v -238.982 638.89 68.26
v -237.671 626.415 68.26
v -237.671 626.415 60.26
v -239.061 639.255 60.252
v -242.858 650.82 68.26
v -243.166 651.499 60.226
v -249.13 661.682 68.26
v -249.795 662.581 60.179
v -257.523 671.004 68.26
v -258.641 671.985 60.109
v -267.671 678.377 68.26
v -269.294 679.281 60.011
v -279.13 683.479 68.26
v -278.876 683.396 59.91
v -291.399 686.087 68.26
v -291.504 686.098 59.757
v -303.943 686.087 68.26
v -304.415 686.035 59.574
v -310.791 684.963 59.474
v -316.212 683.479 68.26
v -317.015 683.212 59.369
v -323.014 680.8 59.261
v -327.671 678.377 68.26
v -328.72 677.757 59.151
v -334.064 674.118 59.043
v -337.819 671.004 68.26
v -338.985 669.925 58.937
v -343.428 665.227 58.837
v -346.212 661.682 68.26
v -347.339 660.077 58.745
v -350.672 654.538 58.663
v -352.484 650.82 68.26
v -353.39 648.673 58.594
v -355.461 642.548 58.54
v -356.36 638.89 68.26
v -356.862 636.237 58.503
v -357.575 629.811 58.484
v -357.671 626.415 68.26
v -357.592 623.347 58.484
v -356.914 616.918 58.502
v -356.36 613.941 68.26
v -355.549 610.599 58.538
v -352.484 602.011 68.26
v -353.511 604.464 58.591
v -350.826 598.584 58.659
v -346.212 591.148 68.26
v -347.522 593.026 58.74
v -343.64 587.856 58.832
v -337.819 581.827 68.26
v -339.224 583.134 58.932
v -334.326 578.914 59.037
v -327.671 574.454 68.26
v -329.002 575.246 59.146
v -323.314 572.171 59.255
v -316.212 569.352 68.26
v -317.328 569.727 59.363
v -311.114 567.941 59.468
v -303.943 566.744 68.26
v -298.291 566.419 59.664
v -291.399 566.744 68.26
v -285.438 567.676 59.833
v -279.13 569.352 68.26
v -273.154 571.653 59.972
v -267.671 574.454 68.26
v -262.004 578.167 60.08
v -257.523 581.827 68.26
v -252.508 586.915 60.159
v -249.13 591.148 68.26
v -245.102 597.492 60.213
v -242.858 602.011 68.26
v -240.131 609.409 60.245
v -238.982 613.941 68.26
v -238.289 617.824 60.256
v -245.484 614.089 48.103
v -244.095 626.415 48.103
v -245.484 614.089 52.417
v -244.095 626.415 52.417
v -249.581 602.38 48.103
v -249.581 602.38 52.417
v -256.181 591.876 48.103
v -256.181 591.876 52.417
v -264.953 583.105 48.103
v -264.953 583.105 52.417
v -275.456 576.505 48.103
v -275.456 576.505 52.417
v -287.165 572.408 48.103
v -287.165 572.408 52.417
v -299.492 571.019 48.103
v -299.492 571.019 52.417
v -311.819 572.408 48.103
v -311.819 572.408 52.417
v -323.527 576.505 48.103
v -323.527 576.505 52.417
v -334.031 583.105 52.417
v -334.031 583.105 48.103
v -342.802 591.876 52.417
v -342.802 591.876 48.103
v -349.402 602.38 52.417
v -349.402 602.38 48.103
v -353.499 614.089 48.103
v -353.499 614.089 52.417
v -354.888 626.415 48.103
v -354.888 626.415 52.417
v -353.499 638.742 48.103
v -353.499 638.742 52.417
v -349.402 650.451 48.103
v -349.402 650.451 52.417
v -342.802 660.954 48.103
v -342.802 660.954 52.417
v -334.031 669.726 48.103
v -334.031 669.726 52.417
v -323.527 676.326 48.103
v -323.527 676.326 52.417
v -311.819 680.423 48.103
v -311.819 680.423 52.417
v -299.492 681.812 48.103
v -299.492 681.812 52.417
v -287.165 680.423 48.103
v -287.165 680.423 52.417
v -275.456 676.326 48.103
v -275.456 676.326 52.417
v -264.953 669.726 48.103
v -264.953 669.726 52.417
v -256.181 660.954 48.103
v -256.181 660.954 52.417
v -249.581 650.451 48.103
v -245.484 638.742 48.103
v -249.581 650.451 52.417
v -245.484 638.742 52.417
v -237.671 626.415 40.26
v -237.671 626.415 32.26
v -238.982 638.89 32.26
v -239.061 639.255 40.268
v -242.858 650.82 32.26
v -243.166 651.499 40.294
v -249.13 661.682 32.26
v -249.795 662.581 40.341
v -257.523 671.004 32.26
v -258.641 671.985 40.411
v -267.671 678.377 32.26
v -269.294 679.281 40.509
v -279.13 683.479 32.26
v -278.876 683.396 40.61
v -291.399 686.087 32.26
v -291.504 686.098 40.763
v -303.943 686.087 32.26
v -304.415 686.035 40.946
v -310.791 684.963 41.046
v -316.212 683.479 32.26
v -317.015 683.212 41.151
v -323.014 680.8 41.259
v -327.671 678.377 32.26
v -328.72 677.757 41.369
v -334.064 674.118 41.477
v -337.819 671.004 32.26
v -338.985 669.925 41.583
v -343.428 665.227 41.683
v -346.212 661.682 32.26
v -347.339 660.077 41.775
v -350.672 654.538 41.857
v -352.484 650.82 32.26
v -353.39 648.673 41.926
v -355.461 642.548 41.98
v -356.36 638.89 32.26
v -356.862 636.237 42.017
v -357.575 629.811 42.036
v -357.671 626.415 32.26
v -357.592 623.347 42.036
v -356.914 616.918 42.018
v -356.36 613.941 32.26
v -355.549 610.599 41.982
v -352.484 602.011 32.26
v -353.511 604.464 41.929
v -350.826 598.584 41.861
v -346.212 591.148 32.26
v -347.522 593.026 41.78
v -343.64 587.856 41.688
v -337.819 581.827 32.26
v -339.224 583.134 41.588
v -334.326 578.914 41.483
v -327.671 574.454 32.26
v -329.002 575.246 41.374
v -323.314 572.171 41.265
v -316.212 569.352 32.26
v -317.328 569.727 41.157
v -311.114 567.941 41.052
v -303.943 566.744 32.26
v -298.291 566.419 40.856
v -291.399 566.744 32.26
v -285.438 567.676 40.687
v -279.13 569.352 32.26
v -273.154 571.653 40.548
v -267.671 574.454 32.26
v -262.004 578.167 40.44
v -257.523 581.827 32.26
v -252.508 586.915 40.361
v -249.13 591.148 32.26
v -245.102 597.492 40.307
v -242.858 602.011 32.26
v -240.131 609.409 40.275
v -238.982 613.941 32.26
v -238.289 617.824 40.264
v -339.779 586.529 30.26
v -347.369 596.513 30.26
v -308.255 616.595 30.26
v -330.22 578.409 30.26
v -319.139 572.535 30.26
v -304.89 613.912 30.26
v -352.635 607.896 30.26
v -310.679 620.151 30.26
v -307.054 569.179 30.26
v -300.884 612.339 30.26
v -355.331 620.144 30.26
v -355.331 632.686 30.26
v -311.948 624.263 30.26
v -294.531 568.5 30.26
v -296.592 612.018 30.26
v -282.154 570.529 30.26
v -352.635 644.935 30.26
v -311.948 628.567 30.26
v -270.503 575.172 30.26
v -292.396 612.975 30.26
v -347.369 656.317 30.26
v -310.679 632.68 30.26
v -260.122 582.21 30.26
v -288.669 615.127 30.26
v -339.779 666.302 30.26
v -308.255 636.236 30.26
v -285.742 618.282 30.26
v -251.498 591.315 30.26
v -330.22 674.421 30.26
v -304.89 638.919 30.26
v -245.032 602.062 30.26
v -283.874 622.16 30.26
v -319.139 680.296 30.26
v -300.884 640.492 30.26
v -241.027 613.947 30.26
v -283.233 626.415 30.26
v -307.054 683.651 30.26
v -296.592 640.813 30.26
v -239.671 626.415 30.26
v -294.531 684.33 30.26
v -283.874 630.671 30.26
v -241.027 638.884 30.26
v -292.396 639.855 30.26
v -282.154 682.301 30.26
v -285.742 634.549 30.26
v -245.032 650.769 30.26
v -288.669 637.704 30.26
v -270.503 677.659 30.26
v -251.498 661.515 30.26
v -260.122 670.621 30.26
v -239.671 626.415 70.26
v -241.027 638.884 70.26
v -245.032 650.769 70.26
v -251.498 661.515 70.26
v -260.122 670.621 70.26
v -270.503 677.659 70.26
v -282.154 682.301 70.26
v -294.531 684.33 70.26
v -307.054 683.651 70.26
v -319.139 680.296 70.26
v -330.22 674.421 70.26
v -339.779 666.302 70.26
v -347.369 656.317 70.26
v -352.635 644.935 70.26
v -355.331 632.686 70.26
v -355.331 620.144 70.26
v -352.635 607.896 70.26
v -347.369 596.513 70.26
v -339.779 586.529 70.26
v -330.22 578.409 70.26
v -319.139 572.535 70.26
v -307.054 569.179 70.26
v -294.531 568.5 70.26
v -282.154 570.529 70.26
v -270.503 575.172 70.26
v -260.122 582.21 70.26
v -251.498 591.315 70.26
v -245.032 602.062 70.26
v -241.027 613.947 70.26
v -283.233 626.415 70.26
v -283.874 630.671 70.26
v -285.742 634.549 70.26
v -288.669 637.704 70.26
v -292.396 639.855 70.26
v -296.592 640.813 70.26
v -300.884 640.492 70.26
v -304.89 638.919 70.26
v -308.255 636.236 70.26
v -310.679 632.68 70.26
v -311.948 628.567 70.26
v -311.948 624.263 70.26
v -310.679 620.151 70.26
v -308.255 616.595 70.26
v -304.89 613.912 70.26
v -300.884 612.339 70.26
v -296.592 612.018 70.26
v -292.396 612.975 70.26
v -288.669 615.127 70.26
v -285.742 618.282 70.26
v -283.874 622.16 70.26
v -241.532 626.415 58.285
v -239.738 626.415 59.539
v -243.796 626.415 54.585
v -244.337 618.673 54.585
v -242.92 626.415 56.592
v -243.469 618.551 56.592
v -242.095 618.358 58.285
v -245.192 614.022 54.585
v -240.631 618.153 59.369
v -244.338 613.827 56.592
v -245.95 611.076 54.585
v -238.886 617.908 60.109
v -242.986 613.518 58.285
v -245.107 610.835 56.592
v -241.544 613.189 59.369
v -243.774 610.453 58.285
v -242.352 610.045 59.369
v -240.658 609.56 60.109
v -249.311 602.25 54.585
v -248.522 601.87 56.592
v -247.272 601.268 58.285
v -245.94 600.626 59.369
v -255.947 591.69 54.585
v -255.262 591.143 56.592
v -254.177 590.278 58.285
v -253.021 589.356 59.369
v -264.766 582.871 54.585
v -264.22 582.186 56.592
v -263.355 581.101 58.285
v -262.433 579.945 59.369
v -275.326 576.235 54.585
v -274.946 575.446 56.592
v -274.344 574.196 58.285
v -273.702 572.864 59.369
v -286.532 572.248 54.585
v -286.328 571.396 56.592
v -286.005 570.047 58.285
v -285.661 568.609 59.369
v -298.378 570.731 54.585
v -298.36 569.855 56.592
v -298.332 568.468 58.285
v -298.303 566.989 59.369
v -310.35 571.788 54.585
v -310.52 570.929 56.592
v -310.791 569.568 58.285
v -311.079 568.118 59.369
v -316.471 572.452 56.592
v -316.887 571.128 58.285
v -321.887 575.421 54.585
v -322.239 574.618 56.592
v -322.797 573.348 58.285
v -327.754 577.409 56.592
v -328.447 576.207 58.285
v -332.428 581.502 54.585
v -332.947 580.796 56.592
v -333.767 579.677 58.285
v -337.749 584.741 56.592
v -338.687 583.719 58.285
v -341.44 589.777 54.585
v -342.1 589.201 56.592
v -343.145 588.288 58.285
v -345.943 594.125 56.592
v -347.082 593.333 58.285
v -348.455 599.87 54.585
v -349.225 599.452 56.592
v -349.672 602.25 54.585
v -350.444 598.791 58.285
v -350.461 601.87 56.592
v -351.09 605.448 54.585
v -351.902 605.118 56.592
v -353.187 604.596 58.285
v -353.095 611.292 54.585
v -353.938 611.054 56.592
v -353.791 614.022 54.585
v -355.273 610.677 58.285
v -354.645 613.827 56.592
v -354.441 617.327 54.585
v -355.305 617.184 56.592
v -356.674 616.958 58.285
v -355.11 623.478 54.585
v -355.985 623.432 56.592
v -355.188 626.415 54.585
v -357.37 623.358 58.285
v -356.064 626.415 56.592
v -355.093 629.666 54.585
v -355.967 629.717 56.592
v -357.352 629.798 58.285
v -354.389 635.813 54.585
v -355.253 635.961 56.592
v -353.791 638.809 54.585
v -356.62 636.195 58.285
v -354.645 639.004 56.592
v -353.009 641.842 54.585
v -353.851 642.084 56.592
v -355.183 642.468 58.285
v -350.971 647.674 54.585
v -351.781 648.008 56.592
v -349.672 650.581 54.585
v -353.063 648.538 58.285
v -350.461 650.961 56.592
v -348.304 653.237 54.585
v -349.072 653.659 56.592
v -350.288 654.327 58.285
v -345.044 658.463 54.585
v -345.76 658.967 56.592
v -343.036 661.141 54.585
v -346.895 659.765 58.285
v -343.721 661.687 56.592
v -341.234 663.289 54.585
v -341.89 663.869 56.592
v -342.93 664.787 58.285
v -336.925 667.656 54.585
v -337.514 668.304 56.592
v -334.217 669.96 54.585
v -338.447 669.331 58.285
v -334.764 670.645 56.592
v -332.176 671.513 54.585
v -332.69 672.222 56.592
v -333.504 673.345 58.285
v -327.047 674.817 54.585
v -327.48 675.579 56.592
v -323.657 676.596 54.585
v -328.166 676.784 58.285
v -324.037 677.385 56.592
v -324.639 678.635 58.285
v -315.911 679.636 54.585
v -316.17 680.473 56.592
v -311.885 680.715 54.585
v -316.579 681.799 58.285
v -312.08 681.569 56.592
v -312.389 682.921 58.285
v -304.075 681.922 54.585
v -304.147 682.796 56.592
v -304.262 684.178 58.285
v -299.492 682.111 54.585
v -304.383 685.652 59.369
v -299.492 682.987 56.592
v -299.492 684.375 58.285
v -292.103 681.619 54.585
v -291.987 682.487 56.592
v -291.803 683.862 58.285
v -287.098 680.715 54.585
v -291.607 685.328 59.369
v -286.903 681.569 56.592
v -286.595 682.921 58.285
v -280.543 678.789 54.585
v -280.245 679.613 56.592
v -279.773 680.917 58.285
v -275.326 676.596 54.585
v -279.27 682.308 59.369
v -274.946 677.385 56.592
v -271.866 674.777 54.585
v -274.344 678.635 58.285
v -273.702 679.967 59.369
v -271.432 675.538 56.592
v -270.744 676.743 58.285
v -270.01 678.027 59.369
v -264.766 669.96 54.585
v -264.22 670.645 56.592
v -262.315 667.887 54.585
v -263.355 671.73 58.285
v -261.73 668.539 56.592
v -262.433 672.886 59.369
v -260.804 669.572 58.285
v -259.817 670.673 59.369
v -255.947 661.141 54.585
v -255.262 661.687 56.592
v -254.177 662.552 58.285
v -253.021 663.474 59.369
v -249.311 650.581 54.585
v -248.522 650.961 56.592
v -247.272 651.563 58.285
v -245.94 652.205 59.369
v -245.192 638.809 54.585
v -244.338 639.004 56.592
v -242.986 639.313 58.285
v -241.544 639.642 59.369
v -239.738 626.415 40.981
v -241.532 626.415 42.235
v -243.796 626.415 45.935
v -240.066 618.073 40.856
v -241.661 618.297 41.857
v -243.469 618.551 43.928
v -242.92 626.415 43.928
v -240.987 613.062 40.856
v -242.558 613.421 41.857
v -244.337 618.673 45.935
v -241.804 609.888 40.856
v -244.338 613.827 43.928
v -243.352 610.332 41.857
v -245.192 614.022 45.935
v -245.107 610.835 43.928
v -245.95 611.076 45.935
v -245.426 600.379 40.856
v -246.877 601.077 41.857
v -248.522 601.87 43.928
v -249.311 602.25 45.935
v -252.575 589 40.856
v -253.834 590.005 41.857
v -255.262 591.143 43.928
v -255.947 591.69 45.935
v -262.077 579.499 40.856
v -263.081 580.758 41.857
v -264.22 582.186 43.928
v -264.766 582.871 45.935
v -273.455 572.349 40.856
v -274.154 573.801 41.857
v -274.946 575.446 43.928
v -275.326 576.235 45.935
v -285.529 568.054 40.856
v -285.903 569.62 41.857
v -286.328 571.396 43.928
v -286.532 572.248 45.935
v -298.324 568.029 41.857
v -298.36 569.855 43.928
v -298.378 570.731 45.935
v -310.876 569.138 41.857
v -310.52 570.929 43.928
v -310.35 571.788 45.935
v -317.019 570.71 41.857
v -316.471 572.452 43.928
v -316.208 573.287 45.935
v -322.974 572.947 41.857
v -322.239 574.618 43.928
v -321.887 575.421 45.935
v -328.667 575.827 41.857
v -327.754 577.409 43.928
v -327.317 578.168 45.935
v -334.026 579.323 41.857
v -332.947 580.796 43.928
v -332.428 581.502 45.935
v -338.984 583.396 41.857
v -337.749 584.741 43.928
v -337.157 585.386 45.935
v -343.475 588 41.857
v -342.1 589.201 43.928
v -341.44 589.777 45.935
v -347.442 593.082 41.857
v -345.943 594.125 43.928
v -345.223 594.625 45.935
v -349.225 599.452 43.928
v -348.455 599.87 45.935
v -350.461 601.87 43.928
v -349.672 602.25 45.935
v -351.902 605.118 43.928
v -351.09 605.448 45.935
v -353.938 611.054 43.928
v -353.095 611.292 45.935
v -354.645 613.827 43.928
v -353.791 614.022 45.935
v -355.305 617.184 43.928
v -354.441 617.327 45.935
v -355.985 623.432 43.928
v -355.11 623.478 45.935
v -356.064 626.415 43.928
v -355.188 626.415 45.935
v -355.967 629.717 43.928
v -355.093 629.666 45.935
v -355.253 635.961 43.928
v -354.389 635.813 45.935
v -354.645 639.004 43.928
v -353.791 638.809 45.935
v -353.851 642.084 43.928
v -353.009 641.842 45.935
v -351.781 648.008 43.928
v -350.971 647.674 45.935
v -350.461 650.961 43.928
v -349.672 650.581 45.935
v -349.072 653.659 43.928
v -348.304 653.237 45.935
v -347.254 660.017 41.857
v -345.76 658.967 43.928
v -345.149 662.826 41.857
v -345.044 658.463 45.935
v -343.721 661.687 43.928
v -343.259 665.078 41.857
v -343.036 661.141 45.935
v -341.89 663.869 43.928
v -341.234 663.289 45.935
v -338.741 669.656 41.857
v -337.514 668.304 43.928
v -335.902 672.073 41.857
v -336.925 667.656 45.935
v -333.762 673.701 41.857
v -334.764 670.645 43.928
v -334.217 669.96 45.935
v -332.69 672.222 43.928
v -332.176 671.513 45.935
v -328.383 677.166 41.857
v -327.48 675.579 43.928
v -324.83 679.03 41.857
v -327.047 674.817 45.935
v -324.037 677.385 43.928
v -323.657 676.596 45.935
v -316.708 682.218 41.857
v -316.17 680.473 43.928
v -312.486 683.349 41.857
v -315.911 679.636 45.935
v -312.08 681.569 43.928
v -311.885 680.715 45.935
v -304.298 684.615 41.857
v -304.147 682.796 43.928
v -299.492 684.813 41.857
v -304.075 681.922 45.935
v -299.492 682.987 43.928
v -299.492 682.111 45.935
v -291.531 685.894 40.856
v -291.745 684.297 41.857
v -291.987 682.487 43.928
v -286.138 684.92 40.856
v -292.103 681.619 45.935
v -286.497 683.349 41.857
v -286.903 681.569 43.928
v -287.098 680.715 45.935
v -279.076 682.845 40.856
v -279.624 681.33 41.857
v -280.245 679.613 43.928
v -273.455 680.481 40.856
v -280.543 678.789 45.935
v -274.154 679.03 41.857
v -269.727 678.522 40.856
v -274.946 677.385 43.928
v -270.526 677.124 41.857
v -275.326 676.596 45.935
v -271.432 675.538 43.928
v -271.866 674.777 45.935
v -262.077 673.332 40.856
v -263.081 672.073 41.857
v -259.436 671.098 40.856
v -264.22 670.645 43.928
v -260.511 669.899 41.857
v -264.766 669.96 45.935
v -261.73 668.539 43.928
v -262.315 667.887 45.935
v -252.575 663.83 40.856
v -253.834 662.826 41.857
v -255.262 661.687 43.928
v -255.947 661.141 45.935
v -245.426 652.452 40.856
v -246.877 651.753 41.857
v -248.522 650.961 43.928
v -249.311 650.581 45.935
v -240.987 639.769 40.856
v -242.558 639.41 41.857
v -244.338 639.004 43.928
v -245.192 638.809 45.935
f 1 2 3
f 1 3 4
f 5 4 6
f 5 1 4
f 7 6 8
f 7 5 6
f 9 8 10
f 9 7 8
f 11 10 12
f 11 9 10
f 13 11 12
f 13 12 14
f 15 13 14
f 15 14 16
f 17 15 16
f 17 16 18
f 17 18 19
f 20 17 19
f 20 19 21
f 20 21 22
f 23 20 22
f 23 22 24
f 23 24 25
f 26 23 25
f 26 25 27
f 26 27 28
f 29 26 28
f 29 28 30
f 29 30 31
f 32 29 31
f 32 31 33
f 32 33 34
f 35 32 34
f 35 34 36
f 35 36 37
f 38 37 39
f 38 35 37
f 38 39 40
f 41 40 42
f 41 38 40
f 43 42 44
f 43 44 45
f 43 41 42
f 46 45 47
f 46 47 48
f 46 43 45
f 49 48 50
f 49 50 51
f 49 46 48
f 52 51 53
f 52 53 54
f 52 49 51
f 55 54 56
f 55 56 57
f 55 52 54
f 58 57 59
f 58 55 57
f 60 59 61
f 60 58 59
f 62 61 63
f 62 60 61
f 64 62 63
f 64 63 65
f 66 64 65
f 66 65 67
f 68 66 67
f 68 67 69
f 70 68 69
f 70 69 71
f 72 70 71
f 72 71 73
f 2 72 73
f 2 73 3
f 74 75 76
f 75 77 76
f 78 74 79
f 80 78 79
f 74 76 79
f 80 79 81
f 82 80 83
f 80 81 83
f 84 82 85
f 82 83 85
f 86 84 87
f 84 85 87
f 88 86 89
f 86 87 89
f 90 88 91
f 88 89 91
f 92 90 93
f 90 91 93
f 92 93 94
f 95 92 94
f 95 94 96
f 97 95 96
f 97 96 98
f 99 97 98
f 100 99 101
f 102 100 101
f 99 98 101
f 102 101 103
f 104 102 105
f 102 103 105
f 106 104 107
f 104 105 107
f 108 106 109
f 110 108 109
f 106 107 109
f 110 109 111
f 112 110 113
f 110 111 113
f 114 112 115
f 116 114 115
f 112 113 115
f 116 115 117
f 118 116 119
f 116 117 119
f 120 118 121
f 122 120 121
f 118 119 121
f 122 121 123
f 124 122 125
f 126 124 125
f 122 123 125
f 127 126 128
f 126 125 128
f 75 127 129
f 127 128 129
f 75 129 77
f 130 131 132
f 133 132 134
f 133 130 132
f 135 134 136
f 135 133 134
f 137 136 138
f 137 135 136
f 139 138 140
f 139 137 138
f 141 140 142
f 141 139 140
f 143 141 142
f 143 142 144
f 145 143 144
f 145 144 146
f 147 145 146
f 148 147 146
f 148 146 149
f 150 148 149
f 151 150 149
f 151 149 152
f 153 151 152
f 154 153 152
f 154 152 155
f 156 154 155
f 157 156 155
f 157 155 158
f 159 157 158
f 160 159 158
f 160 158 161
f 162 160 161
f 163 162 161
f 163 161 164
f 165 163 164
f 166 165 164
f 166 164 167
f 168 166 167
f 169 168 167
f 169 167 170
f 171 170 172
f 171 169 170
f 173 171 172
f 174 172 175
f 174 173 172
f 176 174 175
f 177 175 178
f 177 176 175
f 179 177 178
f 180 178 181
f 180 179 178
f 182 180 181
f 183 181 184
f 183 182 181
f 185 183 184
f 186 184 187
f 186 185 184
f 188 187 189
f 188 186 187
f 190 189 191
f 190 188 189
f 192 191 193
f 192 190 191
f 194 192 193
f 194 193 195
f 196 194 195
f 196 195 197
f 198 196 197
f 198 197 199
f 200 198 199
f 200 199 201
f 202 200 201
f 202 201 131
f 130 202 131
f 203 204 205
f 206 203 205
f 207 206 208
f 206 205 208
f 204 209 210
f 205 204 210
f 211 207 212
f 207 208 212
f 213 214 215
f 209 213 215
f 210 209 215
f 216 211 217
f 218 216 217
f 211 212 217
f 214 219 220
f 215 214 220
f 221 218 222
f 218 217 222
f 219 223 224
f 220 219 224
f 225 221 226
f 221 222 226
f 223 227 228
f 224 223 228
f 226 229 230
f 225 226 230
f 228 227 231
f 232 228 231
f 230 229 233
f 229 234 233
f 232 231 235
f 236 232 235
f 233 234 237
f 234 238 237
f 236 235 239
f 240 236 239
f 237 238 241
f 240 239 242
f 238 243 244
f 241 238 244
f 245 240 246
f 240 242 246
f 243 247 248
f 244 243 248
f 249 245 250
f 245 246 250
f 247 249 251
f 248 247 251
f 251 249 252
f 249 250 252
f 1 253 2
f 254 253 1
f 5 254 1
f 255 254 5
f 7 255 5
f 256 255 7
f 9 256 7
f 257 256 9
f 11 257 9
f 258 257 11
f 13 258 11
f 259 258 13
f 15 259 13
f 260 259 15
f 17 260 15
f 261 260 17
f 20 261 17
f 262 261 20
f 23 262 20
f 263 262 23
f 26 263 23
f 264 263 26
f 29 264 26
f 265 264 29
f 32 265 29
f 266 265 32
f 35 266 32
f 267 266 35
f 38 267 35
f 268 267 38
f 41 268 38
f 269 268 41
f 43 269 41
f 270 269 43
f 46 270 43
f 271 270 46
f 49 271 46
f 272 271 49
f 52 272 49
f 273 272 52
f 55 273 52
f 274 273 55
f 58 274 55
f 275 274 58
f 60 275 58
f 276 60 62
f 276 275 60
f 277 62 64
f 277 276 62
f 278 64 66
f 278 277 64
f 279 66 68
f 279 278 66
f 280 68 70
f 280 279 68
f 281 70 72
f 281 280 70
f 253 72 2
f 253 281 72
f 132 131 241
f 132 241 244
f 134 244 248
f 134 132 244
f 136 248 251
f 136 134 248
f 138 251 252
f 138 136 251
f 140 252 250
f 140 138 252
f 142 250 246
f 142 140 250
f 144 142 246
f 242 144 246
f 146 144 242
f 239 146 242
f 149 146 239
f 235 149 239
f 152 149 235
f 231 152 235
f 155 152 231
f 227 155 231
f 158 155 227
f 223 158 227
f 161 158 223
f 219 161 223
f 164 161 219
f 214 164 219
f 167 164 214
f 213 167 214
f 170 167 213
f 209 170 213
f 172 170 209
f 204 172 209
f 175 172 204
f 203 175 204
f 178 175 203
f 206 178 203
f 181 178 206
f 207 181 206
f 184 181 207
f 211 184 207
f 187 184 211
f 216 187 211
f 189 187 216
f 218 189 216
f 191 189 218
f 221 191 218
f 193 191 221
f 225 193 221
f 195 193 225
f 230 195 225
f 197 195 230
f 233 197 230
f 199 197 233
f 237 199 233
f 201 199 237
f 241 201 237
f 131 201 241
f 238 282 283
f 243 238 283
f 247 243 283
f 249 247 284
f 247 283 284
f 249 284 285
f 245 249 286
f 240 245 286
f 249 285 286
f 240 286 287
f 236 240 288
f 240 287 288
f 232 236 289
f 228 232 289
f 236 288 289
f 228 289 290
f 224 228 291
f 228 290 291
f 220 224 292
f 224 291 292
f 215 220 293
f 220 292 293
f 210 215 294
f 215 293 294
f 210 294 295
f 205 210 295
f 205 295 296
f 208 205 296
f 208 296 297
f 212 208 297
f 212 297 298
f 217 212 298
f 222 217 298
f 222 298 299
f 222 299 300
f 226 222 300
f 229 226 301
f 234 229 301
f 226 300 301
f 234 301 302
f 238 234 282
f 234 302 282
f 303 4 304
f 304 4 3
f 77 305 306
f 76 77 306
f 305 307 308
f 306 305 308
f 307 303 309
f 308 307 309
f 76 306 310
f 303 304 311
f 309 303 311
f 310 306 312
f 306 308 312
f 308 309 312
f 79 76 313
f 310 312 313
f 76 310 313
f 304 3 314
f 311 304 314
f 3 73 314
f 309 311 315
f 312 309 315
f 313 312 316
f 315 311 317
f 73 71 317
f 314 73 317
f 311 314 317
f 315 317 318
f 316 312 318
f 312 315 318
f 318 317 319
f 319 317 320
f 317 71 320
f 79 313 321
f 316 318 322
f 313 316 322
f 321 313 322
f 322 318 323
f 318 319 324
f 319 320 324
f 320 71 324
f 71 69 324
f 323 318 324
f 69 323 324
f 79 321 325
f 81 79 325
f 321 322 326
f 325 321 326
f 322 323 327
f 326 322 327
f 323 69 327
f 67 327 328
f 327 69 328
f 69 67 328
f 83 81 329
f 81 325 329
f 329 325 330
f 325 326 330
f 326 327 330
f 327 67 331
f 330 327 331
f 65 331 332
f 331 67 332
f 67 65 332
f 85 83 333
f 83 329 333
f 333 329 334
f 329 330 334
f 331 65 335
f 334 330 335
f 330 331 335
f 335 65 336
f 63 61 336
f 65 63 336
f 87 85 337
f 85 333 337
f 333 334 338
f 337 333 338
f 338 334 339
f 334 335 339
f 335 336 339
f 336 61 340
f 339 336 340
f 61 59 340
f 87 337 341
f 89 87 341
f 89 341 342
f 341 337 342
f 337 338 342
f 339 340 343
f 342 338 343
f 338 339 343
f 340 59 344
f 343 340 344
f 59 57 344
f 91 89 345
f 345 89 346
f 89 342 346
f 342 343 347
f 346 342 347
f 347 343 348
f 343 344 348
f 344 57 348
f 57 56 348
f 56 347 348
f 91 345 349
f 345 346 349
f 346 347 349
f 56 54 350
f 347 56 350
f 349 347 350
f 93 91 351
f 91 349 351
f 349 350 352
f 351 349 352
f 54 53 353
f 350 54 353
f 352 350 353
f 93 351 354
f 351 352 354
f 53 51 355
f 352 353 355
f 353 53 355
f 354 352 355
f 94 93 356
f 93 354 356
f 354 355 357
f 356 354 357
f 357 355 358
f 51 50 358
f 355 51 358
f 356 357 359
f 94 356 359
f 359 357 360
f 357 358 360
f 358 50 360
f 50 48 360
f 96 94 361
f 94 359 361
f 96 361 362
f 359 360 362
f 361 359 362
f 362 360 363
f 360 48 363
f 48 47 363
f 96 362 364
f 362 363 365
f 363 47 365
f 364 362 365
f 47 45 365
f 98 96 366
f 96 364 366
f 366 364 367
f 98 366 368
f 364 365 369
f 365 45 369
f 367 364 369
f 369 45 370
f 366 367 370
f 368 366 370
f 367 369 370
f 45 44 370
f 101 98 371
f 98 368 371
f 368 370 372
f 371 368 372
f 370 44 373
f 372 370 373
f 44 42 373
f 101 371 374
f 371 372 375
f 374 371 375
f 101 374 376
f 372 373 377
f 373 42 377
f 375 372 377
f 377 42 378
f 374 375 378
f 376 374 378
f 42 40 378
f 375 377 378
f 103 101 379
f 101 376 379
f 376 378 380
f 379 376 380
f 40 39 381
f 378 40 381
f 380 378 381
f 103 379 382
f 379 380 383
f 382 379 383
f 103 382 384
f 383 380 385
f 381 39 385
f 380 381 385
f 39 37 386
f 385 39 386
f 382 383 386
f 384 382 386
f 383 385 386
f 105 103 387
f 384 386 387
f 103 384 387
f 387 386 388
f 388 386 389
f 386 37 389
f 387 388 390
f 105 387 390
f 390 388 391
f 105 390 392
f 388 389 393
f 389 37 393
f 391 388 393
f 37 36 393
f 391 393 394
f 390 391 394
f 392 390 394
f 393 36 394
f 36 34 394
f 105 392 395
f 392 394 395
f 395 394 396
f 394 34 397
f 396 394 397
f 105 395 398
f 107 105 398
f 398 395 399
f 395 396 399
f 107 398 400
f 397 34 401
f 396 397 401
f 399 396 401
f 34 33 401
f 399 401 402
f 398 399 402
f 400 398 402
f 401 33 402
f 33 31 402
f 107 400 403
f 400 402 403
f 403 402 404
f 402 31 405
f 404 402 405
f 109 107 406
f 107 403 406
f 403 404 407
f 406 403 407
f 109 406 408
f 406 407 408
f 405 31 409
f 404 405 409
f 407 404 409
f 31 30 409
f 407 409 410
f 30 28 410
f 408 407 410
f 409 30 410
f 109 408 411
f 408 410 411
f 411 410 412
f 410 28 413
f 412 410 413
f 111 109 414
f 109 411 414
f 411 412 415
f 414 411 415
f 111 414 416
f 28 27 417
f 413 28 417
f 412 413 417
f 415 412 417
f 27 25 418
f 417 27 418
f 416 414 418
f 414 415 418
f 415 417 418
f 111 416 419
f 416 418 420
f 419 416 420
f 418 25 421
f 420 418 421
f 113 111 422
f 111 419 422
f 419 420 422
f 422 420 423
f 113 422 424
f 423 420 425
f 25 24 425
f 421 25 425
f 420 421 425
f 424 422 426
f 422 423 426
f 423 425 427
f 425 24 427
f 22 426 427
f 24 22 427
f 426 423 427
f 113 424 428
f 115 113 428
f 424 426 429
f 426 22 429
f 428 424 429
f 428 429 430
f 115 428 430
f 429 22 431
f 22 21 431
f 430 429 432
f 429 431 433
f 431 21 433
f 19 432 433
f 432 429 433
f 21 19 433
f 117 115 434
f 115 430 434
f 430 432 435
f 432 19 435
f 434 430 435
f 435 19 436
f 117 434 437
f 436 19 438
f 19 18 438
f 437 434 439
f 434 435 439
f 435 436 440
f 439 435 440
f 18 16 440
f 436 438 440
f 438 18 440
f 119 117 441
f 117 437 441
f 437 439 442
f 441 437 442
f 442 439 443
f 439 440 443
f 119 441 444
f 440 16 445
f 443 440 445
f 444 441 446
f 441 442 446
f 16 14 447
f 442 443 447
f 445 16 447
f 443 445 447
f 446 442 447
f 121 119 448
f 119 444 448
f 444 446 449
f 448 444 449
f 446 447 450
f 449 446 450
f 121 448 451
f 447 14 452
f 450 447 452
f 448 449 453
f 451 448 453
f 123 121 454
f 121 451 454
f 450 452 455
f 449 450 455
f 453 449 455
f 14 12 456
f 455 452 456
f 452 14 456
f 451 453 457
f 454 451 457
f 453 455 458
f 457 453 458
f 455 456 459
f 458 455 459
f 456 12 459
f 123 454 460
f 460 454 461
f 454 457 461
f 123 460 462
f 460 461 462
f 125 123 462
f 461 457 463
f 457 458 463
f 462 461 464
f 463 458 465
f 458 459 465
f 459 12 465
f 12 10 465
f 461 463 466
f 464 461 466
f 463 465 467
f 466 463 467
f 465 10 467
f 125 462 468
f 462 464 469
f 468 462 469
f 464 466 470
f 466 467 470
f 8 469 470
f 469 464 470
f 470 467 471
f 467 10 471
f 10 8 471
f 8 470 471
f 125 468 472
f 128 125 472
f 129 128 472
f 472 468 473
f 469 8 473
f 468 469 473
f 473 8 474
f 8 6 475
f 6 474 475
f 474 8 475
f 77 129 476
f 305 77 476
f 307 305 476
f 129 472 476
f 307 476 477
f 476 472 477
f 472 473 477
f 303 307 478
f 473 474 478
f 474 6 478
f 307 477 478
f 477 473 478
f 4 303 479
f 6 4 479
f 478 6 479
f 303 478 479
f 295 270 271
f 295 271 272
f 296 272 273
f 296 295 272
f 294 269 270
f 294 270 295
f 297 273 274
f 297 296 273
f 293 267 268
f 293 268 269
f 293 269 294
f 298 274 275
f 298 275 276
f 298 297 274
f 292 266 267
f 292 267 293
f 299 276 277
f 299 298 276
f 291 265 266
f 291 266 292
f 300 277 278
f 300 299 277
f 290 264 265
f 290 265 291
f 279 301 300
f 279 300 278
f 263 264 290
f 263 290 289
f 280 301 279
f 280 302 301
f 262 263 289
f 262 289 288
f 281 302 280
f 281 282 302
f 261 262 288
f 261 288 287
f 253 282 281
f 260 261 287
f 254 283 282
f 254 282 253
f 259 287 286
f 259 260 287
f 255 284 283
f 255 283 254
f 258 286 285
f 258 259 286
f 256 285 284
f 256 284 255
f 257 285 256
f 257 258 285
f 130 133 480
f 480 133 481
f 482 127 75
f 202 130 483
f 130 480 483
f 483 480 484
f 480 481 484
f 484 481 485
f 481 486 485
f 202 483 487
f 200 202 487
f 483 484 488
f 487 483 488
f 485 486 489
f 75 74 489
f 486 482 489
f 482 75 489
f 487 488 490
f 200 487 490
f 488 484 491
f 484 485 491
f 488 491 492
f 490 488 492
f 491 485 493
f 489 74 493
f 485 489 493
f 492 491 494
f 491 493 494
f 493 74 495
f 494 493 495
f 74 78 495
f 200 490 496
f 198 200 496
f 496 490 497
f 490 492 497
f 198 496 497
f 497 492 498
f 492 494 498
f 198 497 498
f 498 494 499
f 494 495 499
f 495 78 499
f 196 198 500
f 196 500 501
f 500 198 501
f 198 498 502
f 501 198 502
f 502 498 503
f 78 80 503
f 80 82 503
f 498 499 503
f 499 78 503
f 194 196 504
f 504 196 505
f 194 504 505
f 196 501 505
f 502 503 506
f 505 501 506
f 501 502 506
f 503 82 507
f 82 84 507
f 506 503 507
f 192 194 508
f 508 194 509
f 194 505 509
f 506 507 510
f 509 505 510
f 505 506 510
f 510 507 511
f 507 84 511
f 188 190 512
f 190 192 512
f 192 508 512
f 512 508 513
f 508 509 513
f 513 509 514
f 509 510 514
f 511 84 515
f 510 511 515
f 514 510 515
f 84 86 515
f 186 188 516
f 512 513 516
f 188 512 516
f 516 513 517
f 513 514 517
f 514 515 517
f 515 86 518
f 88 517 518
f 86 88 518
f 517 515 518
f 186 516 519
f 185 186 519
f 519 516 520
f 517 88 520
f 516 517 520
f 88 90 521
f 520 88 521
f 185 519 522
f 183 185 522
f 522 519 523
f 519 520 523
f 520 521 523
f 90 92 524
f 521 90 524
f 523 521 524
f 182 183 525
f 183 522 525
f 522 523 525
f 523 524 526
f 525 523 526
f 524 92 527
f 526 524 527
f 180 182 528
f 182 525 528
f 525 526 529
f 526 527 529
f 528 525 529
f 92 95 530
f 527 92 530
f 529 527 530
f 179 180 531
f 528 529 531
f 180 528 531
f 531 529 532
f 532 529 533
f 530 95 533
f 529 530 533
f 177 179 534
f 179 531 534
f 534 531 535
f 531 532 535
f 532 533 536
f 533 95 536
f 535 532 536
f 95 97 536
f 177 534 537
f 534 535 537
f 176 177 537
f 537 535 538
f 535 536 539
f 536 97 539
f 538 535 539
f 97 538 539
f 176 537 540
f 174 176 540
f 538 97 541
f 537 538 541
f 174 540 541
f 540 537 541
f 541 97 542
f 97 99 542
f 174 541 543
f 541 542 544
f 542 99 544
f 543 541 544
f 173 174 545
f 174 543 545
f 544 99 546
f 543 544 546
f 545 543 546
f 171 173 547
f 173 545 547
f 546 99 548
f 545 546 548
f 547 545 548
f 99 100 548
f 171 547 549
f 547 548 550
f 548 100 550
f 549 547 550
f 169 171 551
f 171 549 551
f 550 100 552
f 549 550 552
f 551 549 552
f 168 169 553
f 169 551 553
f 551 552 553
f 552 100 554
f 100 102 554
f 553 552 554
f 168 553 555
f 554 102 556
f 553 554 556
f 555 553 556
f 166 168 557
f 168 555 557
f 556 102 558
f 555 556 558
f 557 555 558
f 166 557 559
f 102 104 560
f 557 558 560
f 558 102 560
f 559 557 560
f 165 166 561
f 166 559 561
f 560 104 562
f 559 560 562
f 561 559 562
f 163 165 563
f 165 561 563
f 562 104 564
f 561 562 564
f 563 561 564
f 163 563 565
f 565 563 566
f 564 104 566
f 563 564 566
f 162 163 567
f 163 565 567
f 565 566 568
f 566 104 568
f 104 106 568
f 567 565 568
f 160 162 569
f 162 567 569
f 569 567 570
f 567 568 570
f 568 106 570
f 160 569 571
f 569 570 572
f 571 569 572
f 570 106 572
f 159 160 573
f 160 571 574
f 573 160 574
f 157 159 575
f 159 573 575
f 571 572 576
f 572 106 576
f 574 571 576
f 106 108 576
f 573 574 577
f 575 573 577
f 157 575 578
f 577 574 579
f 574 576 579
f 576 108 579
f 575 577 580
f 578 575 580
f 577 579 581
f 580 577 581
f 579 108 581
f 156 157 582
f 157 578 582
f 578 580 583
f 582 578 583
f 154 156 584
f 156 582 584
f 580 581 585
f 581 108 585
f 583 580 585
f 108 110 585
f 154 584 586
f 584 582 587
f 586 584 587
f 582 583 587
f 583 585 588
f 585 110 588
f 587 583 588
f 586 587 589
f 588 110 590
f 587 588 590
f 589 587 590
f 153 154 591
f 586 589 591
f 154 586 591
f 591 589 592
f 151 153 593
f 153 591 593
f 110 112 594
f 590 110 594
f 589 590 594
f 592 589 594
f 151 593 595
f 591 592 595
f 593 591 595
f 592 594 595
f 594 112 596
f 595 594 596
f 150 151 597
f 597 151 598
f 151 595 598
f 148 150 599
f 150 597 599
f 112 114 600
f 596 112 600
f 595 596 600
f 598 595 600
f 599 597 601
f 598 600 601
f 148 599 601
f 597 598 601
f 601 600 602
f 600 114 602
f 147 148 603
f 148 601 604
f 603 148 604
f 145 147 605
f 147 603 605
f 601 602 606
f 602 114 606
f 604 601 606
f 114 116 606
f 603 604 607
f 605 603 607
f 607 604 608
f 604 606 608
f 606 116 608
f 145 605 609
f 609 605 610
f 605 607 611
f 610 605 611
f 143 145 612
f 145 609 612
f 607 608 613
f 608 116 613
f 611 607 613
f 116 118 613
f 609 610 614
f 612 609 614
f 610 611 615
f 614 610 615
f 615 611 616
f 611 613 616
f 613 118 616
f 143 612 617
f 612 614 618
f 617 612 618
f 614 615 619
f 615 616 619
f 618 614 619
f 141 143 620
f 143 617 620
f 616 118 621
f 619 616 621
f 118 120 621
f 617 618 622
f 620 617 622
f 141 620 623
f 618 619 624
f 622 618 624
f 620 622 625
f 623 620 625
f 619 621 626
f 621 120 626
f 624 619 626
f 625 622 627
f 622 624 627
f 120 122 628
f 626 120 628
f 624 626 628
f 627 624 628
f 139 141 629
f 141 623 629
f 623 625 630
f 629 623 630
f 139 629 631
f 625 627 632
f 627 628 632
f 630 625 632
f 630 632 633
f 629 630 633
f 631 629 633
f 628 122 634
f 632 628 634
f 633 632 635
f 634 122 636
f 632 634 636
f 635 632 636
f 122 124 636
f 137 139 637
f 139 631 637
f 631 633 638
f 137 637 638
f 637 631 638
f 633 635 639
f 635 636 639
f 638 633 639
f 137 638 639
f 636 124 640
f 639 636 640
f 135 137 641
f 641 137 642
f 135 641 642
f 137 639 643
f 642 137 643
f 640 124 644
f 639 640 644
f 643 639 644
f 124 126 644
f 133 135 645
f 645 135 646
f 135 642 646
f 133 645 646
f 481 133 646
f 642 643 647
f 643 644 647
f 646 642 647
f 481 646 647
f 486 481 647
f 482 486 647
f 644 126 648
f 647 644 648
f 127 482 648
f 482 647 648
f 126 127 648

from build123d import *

# Parameters (mm, degrees)
SKETCH_1_R      = 60
SKETCH_1_R_2    = 14.438127561
EXTRUDE_1_DEPTH = 40
CHAMFER_1_SIZE  = 2


with BuildPart() as part:
    # 草图1 → 凸台-拉伸1 (new body)
    with BuildSketch(Plane.XY.offset(70.26)):
        with Locations((-297.670899951, 626.415366791)):
            Circle(SKETCH_1_R)
        with Locations((-297.670899951, 626.415366791)):
            Circle(SKETCH_1_R_2, mode=Mode.SUBTRACT)
    extrude(amount=-EXTRUDE_1_DEPTH)

    # 草图4 → 切除-旋转1 (revolve, cut)
    with BuildSketch(Plane(origin=(0, 626.415366791, 0), x_dir=(1, 0, 0), z_dir=(0, 1, 0))):
        with BuildLine():
            Line((-244.095308656, -48.103310059), (-244.095308655, -52.416689982))
            ThreePointArc((-244.095308655, -52.416689982), (-242.284199059, -57.48597347), (-237.670899813, -60.259999987))
            Line((-237.670899813, -60.259999987), (-237.670899811, -40.260000013))
            ThreePointArc((-237.670899811, -40.260000013), (-242.284199071, -43.034026546), (-244.095308656, -48.103310059))
        make_face()
    revolve(axis=Axis((-299.491656028, 626.415366791, 70.26), (0, 0, -1)), mode=Mode.SUBTRACT)

    # 倒角1
    chamfer_1_edges = [part.edges().sort_by_distance(p)[0] for p in [
        (-357.670899951, 626.415366791, 70.26),
        (-357.670899951, 626.415366791, 30.26),
    ]]
    chamfer(chamfer_1_edges, length=CHAMFER_1_SIZE)


solid = part.part
